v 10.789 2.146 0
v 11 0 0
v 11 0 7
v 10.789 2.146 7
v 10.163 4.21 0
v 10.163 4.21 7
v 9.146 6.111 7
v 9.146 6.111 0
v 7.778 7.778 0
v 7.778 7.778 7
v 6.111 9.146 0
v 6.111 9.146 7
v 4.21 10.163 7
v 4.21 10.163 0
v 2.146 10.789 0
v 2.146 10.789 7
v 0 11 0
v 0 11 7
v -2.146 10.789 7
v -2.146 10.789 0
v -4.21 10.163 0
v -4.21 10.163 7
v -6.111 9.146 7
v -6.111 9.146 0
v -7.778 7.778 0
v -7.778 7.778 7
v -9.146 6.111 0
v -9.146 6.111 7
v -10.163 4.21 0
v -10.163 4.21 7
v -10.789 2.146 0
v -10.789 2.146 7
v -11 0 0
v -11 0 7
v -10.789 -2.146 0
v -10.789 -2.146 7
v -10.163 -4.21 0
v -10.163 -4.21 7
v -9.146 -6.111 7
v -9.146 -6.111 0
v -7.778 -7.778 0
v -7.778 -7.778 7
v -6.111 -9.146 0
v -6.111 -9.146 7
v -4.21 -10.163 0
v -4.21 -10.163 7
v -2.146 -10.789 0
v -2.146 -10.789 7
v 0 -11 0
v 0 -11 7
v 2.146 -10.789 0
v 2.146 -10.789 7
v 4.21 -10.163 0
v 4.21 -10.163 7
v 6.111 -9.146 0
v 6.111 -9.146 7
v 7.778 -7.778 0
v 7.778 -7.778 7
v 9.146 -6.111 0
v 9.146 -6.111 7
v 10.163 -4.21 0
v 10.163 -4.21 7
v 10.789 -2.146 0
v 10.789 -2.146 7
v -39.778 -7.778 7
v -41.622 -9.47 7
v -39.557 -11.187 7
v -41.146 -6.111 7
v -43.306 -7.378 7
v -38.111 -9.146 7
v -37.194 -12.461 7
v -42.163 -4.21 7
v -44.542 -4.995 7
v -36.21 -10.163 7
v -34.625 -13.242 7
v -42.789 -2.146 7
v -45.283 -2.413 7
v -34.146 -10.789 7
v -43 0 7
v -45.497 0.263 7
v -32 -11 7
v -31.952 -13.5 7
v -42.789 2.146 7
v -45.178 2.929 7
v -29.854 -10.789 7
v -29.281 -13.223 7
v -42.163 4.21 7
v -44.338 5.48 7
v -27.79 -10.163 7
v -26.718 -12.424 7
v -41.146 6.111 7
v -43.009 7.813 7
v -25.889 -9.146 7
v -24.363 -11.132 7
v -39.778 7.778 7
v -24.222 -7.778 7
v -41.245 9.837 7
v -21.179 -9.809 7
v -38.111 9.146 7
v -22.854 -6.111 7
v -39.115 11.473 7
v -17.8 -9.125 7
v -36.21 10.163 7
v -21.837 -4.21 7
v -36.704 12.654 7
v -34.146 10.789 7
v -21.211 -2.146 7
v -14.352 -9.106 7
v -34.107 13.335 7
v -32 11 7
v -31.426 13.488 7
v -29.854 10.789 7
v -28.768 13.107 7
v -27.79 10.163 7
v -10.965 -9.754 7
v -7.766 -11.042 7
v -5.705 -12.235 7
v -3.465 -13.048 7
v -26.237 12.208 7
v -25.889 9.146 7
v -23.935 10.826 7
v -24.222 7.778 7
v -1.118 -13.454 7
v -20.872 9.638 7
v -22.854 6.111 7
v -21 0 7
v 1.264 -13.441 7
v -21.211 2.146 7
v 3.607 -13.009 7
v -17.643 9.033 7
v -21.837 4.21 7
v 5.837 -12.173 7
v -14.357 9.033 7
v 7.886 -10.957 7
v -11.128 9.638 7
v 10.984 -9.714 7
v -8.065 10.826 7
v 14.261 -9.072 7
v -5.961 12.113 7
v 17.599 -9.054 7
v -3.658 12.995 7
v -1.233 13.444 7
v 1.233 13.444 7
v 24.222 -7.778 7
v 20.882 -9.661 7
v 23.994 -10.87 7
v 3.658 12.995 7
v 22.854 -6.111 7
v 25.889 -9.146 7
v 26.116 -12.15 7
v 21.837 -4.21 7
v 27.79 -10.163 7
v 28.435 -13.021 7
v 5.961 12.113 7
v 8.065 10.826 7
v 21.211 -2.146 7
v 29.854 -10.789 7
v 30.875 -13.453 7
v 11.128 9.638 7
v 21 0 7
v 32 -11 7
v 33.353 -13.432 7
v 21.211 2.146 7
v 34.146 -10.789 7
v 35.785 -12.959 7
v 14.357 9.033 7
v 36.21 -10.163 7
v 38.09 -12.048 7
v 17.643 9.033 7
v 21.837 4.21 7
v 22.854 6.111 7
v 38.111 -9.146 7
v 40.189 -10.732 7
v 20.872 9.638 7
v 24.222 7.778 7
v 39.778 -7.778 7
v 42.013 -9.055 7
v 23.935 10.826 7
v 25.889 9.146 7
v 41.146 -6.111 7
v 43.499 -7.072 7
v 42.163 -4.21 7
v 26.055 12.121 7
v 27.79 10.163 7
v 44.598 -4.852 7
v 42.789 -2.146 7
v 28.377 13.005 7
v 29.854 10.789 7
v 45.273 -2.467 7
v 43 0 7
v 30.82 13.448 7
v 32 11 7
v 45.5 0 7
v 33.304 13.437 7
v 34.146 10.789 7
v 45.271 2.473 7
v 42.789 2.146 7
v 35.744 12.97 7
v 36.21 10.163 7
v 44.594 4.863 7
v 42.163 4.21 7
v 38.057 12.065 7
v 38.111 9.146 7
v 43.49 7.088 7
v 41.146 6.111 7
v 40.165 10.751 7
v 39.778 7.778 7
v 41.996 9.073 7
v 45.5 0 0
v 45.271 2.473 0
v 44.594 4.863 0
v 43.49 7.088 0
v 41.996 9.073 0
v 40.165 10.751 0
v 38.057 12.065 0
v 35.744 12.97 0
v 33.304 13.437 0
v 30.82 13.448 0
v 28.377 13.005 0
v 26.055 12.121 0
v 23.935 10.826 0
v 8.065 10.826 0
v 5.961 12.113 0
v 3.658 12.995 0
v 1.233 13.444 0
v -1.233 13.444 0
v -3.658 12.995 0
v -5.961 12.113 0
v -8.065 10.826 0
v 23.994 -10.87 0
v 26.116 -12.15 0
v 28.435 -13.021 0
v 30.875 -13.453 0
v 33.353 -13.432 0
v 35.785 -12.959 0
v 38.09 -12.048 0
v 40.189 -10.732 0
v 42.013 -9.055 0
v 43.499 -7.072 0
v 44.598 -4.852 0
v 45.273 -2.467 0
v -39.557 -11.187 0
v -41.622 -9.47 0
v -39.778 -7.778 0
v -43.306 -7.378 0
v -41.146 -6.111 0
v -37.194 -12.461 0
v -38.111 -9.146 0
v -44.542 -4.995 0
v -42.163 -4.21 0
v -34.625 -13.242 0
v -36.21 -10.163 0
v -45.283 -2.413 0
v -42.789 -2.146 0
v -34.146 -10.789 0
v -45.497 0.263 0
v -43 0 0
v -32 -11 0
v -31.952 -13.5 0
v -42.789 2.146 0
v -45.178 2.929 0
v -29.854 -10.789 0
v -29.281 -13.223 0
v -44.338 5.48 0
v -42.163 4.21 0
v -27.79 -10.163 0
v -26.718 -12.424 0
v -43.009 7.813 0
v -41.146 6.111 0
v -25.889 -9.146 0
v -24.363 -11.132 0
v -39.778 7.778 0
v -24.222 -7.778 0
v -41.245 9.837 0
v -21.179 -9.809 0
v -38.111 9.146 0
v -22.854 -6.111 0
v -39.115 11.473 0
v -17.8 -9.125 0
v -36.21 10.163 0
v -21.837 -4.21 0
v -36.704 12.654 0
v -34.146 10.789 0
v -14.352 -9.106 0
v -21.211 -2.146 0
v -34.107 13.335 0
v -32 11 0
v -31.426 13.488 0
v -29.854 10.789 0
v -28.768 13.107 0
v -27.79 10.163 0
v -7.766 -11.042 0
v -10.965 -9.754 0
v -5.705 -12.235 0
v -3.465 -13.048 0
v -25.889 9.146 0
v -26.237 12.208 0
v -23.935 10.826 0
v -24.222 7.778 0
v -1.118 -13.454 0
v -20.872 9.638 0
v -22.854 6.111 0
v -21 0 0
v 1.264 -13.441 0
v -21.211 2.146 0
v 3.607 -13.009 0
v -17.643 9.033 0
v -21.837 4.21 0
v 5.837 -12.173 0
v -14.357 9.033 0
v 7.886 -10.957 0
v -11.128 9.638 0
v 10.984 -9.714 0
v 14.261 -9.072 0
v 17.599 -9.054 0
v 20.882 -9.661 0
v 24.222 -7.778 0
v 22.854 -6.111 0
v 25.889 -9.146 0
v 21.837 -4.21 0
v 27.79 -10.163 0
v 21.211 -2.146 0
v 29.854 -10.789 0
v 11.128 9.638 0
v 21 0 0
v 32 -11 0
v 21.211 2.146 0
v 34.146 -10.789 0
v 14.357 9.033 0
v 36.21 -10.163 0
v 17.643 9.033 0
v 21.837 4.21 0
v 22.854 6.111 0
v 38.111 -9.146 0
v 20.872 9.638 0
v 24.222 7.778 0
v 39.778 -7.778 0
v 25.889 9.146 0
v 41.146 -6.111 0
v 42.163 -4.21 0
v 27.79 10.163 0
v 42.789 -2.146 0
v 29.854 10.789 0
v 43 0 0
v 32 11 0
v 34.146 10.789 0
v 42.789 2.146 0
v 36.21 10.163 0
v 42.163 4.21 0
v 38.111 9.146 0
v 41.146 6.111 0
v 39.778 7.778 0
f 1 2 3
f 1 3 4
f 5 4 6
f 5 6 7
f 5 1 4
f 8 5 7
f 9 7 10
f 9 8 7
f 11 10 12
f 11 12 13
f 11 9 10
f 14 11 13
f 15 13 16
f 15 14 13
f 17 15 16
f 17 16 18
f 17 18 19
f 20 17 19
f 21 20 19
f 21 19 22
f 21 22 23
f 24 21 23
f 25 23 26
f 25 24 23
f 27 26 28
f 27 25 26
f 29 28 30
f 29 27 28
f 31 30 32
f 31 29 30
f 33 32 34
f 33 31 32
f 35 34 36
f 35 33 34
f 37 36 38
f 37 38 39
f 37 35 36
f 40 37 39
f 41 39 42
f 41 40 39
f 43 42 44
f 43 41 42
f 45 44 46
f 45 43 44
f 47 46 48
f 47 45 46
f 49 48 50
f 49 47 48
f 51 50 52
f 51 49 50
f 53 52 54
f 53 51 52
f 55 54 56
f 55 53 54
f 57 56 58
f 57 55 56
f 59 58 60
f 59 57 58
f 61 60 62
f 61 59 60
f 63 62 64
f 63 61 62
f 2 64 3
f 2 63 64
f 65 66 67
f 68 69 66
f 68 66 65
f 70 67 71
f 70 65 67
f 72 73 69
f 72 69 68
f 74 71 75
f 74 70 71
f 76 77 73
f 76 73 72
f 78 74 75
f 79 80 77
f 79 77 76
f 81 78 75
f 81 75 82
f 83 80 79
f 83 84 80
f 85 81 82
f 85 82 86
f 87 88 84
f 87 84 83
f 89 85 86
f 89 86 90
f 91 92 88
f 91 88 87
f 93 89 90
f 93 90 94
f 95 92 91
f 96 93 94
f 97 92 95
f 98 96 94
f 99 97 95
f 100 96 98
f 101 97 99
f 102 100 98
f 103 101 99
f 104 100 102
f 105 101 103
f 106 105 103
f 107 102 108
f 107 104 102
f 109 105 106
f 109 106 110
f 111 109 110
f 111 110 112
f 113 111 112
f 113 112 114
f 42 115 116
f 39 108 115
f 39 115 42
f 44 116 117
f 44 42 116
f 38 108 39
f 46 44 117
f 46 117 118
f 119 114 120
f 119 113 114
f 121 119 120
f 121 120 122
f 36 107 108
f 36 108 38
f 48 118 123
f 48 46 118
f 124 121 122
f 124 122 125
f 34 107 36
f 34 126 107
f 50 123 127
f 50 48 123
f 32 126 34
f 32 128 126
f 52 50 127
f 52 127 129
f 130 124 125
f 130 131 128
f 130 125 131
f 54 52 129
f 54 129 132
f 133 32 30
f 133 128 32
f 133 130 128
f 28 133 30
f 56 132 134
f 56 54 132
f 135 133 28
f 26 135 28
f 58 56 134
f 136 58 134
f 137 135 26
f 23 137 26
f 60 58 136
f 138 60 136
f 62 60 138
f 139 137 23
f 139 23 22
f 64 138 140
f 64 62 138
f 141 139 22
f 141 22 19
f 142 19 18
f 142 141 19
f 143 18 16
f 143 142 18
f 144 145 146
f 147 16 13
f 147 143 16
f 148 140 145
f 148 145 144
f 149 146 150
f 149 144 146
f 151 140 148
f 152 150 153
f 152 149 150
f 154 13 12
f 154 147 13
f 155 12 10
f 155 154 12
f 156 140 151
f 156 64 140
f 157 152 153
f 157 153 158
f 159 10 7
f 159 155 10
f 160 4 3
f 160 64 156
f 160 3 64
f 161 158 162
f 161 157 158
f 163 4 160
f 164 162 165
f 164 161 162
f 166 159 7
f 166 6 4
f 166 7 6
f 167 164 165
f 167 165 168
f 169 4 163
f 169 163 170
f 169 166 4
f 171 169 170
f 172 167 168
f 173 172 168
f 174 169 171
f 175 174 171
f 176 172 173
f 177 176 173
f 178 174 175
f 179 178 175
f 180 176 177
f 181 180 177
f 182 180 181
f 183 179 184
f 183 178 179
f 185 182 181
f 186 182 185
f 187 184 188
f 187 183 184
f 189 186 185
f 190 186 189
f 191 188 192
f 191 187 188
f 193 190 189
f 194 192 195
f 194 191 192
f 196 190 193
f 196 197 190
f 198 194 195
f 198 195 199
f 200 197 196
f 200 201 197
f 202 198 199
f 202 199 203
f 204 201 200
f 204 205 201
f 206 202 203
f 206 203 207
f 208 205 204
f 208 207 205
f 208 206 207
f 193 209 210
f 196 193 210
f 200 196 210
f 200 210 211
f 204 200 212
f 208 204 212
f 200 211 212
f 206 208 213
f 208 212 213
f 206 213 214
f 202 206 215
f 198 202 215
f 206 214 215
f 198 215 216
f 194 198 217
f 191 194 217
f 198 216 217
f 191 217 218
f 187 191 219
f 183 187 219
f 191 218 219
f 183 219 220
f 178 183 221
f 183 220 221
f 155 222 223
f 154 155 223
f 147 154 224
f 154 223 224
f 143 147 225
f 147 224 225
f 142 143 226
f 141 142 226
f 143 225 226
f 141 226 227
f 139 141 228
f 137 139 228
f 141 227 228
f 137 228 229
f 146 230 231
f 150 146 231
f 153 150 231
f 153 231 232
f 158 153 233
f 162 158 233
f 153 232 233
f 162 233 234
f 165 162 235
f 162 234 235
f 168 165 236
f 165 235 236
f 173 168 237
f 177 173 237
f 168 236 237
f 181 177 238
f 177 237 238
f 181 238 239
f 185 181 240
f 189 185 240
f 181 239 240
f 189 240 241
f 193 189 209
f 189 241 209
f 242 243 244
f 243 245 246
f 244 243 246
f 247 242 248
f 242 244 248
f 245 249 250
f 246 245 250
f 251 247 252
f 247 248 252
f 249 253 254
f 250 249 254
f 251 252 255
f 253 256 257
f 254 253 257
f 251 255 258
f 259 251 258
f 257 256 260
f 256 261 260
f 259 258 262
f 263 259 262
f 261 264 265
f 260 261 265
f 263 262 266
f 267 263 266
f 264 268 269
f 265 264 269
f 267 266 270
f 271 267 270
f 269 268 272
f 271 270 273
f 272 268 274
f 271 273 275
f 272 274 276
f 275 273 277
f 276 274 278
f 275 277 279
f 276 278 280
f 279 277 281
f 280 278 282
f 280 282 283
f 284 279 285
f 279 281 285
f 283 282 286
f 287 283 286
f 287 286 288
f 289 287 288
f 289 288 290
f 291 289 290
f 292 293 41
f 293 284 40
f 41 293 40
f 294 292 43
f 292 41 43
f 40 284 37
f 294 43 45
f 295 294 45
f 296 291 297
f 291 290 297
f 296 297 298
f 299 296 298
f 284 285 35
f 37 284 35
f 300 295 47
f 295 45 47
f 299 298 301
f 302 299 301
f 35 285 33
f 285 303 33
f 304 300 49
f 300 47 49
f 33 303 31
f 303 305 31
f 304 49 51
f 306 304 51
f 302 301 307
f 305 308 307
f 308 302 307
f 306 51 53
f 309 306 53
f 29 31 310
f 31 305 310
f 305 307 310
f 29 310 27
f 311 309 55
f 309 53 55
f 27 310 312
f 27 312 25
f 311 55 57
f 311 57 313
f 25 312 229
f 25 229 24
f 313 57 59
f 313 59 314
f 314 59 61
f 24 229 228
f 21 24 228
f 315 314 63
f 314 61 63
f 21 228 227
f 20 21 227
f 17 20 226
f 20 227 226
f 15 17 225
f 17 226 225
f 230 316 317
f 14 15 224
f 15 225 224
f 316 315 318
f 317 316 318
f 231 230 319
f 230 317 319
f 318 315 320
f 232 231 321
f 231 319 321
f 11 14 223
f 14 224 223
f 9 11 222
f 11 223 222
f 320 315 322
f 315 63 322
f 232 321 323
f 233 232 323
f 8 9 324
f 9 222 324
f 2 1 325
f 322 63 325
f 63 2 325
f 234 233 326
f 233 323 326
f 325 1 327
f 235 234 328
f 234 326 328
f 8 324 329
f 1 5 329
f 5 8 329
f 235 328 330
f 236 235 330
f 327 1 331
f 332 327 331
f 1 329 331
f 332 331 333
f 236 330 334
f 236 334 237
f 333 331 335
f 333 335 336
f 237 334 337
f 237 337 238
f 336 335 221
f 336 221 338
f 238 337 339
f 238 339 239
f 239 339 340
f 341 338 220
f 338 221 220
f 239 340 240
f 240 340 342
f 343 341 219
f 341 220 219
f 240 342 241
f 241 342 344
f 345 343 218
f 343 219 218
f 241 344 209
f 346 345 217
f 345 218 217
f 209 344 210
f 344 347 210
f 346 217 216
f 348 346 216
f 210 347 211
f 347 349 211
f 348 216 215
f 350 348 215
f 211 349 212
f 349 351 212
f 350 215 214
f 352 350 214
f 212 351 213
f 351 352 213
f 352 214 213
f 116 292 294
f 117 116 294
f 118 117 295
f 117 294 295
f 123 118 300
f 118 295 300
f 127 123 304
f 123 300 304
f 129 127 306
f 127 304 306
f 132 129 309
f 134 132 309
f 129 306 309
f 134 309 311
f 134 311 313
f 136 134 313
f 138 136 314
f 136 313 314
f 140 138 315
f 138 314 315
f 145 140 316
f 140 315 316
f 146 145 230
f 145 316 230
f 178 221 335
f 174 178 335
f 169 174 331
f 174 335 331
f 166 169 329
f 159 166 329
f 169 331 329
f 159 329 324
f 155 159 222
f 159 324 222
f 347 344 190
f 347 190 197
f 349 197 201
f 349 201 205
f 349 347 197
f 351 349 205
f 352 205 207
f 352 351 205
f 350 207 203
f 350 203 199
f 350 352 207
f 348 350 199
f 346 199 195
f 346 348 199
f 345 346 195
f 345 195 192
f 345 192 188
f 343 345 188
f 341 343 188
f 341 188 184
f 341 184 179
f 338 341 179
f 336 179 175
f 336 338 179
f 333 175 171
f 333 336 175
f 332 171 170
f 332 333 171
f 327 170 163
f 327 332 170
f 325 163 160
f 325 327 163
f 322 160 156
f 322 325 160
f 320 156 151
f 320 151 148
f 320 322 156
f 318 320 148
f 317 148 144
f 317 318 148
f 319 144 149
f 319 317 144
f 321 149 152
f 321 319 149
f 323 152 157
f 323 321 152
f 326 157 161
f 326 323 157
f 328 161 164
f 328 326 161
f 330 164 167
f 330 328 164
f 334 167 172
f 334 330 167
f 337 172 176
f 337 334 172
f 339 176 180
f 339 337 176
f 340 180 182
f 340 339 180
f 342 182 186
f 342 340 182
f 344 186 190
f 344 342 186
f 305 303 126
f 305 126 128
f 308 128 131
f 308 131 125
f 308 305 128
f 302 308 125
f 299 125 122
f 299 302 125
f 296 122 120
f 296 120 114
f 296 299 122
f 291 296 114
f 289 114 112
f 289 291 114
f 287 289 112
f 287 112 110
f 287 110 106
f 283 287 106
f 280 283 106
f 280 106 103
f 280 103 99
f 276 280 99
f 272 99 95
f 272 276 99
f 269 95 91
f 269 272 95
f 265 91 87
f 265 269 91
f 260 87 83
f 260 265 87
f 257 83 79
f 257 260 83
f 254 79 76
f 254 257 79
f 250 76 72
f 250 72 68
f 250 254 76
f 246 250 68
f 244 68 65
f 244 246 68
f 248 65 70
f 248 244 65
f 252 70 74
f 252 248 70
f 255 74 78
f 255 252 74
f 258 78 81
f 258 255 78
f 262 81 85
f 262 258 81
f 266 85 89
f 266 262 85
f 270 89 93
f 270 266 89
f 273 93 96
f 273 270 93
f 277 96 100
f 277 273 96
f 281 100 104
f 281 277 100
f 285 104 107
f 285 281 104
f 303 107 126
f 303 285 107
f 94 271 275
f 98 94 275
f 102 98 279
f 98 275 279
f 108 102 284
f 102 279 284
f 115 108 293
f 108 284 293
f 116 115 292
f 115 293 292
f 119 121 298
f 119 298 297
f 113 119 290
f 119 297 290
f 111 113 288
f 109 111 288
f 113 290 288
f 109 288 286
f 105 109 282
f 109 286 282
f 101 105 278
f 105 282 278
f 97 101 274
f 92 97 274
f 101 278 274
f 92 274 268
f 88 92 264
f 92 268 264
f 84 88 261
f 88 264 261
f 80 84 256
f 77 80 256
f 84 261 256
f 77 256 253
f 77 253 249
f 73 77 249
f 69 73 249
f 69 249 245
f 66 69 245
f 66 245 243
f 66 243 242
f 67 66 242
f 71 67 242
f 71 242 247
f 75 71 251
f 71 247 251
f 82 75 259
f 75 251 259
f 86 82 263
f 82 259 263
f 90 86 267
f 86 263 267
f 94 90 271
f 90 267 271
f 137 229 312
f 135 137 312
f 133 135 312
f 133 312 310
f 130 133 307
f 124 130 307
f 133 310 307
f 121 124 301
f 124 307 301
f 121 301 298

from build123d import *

# Parameters (mm, degrees)
F0_R     = 11
F1_DEPTH = 7


with BuildPart() as f1:
    # F0 (on Top) → F1 (new body)
    with BuildSketch(Plane.XY):
        with BuildLine():
            ThreePointArc((-24.363253, -11.132389), (-20.055418, -6.291022), (-18.5, 0))
            ThreePointArc((-18.5, 0), (-19.935078, 6.057035), (-23.93521, 10.826318))
            ThreePointArc((-23.93521, 10.826318), (-45.497436, 0.263106), (-24.363253, -11.132389))
        make_face()
        with Locations((-32, 0)):
            Circle(F0_R, mode=Mode.SUBTRACT)
        with BuildLine():
            ThreePointArc((-23.93521, 10.826318), (-19.935078, 6.057035), (-18.5, 0))
            ThreePointArc((-18.5, 0), (-20.055418, -6.291022), (-24.363253, -11.132389))
            ThreePointArc((-24.363253, -11.132389), (-16.075993, -9.03197), (-7.766423, -11.042313))
            ThreePointArc((-7.766423, -11.042313), (-13.498744, -0.184171), (-8.06479, 10.826318))
            ThreePointArc((-8.06479, 10.826318), (-16, 8.957347), (-23.93521, 10.826318))
        make_face()
        with BuildLine():
            ThreePointArc((8.06479, 10.826318), (0, 13.5), (-8.06479, 10.826318))
            ThreePointArc((-8.06479, 10.826318), (-13.498744, -0.184171), (-7.766423, -11.042313))
            ThreePointArc((-7.766423, -11.042313), (0.073268, -13.499801), (7.885822, -10.957363))
            ThreePointArc((7.885822, -10.957363), (12.014753, -6.155948), (13.5, 0))
            ThreePointArc((13.5, 0), (12.064922, 6.057035), (8.06479, 10.826318))
        make_face()
        Circle(F0_R, mode=Mode.SUBTRACT)
        with BuildLine():
            ThreePointArc((23.93521, 10.826318), (16, 8.957347), (8.06479, 10.826318))
            ThreePointArc((8.06479, 10.826318), (12.064922, 6.057035), (13.5, 0))
            ThreePointArc((13.5, 0), (12.014753, -6.155948), (7.885822, -10.957363))
            ThreePointArc((7.885822, -10.957363), (15.929492, -8.984778), (23.994099, -10.869938))
            ThreePointArc((23.994099, -10.869938), (18.50005, -0.036642), (23.93521, 10.826318))
        make_face()
        with BuildLine():
            ThreePointArc((45.5, 0), (38.057035, 12.064922), (23.93521, 10.826318))
            ThreePointArc((23.93521, 10.826318), (18.50005, -0.036642), (23.994099, -10.869938))
            ThreePointArc((23.994099, -10.869938), (38.08976, -12.048437), (45.5, 0))
        make_face()
        with Locations((32, 0)):
            Circle(F0_R, mode=Mode.SUBTRACT)
    extrude(amount=F1_DEPTH)


solid = f1.part
